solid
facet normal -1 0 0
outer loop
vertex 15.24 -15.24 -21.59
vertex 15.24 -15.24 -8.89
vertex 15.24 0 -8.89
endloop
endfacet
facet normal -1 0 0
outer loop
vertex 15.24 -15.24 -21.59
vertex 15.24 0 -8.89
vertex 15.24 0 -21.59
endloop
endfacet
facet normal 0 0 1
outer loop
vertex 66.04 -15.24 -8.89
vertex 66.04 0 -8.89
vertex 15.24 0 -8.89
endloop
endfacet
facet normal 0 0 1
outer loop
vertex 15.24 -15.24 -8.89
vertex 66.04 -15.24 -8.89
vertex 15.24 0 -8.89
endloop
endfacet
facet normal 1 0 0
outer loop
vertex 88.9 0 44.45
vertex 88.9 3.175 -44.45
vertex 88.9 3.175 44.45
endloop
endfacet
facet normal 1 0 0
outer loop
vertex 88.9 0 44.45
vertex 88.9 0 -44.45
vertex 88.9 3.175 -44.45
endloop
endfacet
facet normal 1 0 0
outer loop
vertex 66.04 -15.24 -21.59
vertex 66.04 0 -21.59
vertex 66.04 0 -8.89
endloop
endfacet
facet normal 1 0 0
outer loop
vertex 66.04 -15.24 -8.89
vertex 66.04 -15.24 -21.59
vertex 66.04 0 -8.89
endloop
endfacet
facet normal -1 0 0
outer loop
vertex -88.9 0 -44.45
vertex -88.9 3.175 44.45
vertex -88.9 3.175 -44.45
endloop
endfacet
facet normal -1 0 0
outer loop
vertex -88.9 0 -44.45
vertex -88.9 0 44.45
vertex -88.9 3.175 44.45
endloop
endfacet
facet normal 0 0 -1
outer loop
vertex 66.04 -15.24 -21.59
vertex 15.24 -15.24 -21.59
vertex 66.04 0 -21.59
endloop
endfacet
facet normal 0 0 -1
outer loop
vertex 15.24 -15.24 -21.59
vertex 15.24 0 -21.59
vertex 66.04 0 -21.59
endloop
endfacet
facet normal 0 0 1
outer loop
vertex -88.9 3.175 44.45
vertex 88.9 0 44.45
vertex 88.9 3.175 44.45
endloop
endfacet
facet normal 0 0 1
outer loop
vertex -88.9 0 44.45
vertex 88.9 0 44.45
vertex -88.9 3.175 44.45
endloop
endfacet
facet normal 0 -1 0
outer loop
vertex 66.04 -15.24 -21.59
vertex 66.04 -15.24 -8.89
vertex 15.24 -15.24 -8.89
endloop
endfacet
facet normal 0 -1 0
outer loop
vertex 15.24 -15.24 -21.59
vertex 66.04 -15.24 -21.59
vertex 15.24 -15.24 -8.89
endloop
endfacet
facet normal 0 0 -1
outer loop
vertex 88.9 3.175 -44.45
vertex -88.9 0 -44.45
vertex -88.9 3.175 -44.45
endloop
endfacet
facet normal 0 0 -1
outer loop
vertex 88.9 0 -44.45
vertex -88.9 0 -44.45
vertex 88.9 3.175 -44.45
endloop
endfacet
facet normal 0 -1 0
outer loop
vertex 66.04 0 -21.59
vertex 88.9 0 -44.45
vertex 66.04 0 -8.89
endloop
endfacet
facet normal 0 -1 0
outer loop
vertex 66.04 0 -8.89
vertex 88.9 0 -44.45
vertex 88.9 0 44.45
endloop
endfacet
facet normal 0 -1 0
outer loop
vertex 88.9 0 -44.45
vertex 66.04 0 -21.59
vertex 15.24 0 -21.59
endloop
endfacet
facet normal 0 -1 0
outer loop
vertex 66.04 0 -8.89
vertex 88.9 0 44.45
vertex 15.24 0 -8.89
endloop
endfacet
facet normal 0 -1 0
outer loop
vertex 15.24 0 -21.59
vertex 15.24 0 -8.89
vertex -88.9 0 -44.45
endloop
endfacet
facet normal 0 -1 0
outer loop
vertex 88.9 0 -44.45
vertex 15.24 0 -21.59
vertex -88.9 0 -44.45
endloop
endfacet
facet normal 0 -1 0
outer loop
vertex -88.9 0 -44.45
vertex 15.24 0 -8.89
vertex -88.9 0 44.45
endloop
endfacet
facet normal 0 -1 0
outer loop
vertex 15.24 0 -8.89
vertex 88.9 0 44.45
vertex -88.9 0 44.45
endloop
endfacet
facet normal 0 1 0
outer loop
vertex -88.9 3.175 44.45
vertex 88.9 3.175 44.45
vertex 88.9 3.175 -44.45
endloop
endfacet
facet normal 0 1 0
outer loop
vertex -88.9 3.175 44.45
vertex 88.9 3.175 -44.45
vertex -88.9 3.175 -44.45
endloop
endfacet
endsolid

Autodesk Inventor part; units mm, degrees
ref_plane "YZ Plane" through (0, 0, 0) normal (1, 0, 0) x (0, 1, 0)
ref_plane "XZ Plane" through (0, 0, 0) normal (0, 1, 0) x (-1, 0, 0)
ref_plane "XY Plane" through (0, 0, 0) normal (0, 0, 1) x (1, 0, 0)
sketch "Sketch1" plane through (0, 0, 0) normal (0, 1, 0) x (-1, 0, 0)
  line L0 (-88.9, 44.45) -> (88.9, 44.45)
  line L1 (88.9, 44.45) -> (88.9, -44.45)
  line L2 (88.9, -44.45) -> (-88.9, -44.45)
  line L3 (-88.9, -44.45) -> (-88.9, 44.45)
  line L4 (-88.9, 44.45) -> (88.9, -44.45) construction
  line L5 (88.9, 44.45) -> (-88.9, -44.45) construction
  line L6 (-66.04, -8.89) -> (-15.24, -8.89)
  line L7 (-15.24, -8.89) -> (-15.24, -21.59)
  line L8 (-15.24, -21.59) -> (-66.04, -21.59)
  line L9 (-66.04, -21.59) -> (-66.04, -8.89)
  line L10 (-66.04, -8.89) -> (-15.24, -21.59) construction
  line L11 (-15.24, -8.89) -> (-66.04, -21.59) construction
  point P0 (0, 0)
  point P1 (-40.64, -15.24)
  dimension "d0" = 177.8
  dimension "d1" = 88.9
  dimension "d2" = 22.86
  dimension "d3" = 22.86
  dimension "d4" = 12.7
  dimension "d5" = 50.8
extrude "Extrusion1" add sketch "Sketch1" along normal blind 3.175 contours L0 L1 L2 L3 | L6 L7 L8 L9
extrude "Extrusion2" add sketch "Sketch1" against normal blind 15.24 contours L6 L7 L8 L9
sketch "Sketch2" plane through (0, 0, 0) normal (0, -1, 0) x (1, 0, 0)
  circle A0 centre (-79.375, 34.925) radius 3.175
  circle A1 centre (-79.375, -34.925) radius 3.175
  circle A2 centre (79.375, 34.925) radius 3.175
  circle A3 centre (79.375, -34.925) radius 3.175
  line L0 (88.9, 44.45) -> (-88.9, 44.45) projected
  line L1 (-88.9, 44.45) -> (-88.9, -44.45) projected
  line L2 (-88.9, -44.45) -> (88.9, -44.45) projected
  line L3 (88.9, -44.45) -> (88.9, 44.45) projected
  point P0 (0, 0)
  dimension "d11" = 9.525
  dimension "d13" = 9.525
  dimension "d14" = 6.35
  dimension "d15" = 9.525
  dimension "d16" = 9.525
equation "\"d11\" = d10"
equation "\"d13\" = d12"
equation "\"d15\" = d11"
equation "\"d16\" = d13"
equation "\"d12\" = d11"
equation "\"d10\" = 9.525"
properties part number "BackCover"
